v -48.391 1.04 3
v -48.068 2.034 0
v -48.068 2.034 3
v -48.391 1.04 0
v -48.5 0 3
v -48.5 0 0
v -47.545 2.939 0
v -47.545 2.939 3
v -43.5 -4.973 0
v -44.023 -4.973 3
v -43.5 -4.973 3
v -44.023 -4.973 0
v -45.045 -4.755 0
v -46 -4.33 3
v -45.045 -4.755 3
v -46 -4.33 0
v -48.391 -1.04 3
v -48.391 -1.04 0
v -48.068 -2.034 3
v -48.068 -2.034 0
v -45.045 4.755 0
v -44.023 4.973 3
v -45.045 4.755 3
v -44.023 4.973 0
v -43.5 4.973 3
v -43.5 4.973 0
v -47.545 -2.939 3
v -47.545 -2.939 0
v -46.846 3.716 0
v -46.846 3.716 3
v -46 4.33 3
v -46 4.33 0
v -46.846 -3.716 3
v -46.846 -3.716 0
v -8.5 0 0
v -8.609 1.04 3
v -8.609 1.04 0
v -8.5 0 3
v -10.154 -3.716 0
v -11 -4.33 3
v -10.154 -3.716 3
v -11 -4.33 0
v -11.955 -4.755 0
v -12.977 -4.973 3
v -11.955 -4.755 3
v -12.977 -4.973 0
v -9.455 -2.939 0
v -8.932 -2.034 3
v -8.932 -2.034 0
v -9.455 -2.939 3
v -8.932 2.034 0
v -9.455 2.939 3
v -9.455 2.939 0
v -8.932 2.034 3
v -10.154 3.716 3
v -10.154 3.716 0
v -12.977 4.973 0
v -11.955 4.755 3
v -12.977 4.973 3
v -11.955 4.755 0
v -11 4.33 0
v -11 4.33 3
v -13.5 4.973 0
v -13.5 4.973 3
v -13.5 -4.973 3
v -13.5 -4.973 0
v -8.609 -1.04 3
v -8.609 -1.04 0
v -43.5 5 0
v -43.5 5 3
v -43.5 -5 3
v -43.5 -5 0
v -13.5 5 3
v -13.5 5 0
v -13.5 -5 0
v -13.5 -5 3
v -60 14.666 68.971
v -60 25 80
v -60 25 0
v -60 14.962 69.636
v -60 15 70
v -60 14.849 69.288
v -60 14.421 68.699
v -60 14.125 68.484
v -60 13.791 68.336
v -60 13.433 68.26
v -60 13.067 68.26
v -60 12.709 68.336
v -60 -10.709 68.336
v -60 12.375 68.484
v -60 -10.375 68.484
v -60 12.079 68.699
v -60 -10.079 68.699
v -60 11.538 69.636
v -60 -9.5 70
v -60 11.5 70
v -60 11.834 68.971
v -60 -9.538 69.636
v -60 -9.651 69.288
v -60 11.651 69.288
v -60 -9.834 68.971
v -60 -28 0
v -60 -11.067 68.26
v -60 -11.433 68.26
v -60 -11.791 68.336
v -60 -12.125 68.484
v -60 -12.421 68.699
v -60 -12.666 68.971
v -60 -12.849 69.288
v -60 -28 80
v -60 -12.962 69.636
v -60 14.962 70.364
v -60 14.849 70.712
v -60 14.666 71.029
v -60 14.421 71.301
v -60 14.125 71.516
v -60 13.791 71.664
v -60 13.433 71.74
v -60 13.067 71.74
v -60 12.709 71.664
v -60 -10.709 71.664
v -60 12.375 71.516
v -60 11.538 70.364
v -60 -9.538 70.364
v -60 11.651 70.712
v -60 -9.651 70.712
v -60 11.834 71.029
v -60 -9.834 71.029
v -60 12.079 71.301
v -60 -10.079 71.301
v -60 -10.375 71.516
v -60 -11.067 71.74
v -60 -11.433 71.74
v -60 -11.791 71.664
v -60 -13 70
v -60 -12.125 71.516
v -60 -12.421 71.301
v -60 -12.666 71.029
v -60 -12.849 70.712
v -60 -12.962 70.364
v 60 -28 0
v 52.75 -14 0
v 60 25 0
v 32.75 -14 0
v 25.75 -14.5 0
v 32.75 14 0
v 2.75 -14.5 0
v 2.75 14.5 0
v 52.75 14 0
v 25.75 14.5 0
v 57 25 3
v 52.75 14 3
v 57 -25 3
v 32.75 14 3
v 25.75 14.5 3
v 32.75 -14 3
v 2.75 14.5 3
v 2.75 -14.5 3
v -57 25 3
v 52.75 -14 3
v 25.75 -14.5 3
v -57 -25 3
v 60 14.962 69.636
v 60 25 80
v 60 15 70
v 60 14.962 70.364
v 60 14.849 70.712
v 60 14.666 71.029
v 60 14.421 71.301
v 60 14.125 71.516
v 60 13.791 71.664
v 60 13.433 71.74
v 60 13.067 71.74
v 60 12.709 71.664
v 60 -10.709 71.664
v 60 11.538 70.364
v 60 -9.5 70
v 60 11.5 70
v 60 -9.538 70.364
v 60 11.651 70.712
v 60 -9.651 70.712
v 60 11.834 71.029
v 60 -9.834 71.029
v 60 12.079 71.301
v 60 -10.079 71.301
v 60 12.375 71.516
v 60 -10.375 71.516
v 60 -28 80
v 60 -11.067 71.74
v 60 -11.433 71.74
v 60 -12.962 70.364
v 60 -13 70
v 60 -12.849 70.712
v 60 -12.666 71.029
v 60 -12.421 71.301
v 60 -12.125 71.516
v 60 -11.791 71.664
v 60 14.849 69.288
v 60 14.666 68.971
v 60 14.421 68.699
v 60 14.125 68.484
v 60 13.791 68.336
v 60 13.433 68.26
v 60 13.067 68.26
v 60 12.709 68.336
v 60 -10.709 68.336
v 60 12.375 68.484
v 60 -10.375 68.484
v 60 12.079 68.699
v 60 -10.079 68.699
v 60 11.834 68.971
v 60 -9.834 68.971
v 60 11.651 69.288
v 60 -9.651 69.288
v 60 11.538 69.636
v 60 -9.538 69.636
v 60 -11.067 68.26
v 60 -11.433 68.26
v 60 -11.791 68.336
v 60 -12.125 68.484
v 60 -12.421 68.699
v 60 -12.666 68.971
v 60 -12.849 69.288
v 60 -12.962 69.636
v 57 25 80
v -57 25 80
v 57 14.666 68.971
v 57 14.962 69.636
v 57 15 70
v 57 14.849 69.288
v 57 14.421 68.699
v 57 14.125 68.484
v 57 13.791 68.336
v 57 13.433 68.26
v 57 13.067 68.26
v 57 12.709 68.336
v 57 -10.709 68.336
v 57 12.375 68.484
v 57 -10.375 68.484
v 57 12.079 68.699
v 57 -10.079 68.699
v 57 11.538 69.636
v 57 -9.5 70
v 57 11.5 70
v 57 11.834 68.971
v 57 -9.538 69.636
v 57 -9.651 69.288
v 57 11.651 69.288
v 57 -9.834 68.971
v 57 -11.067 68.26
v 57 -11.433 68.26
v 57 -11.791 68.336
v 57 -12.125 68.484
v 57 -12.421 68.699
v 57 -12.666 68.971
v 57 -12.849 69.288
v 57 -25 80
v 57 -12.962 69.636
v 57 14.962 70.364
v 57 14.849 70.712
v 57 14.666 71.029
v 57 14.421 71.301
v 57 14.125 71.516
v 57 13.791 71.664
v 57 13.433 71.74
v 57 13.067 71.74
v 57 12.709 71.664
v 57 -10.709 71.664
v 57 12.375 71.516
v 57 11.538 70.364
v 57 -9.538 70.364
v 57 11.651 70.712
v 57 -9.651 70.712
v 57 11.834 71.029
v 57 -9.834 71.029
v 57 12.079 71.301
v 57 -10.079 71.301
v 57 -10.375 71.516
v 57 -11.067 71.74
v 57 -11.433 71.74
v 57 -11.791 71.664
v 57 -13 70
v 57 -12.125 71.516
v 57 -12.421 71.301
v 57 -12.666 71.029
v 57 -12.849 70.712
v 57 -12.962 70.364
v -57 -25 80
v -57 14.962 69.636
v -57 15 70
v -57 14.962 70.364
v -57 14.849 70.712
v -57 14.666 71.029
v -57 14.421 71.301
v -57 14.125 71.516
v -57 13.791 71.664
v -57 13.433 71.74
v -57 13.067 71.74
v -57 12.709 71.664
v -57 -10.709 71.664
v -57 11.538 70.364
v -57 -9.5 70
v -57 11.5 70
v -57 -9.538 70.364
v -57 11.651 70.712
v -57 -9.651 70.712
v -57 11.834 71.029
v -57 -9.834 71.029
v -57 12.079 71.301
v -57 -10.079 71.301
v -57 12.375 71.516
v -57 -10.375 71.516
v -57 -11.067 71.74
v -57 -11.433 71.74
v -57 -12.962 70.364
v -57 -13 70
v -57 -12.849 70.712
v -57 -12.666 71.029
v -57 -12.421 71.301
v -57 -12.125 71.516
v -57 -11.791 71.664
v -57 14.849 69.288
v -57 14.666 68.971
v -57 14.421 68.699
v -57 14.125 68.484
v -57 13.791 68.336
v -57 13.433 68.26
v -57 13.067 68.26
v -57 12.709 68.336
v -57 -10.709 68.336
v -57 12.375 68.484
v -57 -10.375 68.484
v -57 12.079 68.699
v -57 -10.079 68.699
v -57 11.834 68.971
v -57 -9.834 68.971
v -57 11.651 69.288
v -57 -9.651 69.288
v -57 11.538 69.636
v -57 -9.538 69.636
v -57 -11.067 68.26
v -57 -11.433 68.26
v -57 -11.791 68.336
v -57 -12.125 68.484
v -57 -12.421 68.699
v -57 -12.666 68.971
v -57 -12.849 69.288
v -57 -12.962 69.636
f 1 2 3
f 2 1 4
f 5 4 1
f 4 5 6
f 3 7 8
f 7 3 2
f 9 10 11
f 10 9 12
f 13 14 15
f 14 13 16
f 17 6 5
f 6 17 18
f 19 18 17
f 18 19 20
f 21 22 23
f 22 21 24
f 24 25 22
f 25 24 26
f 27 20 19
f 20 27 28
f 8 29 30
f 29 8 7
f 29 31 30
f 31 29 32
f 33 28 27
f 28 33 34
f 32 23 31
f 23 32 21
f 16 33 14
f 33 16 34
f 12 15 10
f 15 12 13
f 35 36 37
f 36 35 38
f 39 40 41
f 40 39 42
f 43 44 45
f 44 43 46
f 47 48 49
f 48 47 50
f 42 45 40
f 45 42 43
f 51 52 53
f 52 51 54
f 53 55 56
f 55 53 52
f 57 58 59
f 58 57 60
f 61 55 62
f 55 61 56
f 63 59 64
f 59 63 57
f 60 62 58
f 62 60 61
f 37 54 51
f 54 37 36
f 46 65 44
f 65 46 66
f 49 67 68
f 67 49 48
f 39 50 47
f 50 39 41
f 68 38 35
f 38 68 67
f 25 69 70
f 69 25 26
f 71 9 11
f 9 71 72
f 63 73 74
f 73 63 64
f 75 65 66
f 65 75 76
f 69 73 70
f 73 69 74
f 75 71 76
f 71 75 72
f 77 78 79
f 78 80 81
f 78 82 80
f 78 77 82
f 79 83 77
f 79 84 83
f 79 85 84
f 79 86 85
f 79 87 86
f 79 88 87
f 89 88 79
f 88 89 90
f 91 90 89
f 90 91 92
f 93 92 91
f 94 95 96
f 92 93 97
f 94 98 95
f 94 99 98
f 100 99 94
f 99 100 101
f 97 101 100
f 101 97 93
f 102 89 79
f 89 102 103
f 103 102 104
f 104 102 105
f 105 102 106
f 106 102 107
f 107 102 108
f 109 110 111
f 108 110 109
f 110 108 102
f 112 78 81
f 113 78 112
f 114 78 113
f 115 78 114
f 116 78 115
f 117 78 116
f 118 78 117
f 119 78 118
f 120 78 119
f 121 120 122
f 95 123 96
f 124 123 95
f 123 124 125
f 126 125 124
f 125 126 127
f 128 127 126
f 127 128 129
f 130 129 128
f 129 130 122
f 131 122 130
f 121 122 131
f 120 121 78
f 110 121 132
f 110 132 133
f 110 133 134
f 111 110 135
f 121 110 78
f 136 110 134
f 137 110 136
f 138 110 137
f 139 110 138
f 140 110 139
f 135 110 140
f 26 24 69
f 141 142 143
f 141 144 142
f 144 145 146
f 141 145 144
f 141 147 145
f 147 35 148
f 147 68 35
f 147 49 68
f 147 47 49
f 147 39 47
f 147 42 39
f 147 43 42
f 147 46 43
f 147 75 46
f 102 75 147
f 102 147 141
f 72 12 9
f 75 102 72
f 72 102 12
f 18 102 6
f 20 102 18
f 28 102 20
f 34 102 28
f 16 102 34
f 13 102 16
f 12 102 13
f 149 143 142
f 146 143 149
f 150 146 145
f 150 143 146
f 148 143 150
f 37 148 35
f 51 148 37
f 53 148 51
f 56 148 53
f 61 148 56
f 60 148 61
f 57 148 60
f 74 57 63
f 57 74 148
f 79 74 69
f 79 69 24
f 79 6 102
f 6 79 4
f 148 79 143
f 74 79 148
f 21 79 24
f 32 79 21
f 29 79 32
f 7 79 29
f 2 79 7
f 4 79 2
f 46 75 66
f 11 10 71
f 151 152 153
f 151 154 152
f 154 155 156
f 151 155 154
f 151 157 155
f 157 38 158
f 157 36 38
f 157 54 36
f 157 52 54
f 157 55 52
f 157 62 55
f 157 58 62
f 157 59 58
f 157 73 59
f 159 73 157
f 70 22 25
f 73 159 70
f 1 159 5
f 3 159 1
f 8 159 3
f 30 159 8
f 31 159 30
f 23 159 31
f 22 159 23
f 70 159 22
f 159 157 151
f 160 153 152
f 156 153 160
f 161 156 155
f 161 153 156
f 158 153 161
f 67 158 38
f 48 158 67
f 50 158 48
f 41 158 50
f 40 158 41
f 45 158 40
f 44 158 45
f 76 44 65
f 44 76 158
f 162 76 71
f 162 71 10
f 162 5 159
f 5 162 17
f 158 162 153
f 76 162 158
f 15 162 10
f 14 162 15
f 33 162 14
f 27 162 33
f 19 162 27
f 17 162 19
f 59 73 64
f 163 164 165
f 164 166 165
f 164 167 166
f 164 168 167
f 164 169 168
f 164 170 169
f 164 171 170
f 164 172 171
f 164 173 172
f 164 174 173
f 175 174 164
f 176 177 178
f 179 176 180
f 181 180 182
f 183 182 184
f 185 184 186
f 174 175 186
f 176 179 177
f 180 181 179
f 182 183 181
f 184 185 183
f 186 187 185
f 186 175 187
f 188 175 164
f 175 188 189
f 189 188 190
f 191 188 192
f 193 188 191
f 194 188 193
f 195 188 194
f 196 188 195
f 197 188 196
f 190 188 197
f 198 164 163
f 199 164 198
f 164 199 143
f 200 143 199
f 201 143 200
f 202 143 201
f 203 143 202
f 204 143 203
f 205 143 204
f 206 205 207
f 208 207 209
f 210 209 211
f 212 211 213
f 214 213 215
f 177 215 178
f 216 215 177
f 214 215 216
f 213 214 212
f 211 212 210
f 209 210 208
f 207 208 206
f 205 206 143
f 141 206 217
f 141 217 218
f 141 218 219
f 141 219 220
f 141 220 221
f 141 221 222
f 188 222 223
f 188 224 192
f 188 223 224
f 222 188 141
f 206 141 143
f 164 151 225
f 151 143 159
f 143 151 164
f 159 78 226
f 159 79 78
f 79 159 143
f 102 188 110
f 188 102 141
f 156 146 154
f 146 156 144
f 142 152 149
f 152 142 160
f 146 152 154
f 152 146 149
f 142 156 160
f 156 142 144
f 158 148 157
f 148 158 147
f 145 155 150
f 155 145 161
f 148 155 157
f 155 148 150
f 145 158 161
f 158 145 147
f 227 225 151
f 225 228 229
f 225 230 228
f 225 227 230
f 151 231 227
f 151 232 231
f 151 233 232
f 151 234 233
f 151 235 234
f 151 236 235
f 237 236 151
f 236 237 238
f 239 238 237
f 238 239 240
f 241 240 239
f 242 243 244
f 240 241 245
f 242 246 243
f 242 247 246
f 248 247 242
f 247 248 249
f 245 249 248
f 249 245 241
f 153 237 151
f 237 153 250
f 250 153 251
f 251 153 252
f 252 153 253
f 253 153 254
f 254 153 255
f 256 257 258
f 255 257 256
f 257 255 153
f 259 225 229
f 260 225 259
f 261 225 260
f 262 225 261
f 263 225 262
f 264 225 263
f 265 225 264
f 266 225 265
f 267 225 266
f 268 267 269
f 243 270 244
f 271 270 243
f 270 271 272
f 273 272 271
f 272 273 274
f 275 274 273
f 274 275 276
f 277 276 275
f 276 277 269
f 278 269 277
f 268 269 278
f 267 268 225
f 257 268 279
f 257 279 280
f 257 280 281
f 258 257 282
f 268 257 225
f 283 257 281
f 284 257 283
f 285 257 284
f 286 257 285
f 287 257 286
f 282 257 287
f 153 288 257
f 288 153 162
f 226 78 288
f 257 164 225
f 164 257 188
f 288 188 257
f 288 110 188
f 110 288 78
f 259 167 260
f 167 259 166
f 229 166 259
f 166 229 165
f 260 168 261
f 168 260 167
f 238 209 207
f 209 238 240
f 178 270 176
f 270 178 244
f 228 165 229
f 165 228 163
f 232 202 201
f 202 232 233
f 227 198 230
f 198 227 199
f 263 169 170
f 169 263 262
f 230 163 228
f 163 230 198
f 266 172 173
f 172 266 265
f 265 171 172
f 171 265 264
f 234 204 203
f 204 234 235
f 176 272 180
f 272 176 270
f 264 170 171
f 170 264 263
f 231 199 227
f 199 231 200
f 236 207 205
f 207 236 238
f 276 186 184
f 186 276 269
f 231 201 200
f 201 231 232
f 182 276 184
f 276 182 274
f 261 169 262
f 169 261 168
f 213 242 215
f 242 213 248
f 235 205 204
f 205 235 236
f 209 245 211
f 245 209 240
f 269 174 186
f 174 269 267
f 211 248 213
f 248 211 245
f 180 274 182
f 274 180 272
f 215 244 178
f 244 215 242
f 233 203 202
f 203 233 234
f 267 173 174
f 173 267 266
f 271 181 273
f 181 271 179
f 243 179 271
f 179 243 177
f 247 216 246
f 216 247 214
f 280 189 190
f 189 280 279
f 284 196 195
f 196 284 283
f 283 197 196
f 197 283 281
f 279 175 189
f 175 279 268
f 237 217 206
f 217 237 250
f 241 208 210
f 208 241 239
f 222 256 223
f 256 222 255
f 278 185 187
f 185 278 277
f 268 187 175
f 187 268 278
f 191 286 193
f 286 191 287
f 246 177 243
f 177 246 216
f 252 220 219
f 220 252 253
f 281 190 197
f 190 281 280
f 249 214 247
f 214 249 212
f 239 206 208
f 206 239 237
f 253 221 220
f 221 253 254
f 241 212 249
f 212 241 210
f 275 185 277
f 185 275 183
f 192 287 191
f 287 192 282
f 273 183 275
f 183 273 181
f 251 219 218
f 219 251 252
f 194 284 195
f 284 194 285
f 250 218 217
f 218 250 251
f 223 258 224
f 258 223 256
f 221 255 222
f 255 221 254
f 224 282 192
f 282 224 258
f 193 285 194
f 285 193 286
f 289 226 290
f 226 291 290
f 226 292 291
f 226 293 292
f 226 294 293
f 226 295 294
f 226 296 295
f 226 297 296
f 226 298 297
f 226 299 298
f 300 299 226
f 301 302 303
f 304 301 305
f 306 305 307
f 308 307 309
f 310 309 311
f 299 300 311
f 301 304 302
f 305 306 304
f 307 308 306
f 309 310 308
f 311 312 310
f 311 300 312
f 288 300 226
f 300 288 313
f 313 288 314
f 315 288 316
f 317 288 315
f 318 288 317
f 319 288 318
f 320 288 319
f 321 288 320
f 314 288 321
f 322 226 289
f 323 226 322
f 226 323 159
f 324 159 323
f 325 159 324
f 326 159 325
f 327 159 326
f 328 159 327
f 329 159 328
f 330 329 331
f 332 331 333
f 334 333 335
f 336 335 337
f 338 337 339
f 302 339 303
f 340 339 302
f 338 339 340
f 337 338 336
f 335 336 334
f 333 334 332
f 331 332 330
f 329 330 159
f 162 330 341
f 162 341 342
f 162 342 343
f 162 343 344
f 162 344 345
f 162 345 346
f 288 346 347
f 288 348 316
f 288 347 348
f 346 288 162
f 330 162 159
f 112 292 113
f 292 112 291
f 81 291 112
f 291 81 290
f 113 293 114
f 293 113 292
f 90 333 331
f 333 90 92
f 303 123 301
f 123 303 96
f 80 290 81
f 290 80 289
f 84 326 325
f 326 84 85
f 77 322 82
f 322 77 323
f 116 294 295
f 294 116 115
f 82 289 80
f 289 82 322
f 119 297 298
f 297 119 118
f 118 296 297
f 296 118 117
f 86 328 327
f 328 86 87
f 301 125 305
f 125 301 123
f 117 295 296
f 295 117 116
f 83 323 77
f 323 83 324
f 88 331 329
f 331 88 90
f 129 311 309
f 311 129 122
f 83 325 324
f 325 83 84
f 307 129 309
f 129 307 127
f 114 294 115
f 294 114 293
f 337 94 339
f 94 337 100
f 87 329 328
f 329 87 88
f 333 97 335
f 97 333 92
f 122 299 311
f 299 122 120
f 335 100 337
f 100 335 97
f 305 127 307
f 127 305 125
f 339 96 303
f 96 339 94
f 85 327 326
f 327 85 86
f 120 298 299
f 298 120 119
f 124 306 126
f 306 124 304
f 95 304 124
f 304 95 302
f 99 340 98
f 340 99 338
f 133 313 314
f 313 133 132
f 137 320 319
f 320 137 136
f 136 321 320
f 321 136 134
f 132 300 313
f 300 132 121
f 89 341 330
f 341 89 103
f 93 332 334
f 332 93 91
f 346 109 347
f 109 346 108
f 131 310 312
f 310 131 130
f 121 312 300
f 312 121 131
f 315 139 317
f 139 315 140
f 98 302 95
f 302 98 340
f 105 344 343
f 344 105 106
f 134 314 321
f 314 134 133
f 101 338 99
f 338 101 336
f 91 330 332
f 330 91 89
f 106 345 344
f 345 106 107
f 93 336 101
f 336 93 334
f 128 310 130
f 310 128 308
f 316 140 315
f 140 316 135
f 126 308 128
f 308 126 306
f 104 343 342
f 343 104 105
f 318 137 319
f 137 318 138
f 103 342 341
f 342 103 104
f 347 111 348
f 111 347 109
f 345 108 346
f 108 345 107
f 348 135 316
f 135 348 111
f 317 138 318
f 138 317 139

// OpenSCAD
$fn=30;

power_supply_width = 114;
power_supply_height = 50;

bracket_depth = 80;

thickness = 3;

power_connector_w = 20;
power_connector_h = 28;

power_switch_w = 23;
power_switch_h = 29;

power_line_hole_w = 40;
power_line_hole_h = 10;

offset_size = 1.1;
offsetp = ((thickness*offset_size) - thickness) /2;
offsetn = offsetp * -1;

screw_size = 3.5;

part_width = power_supply_width + thickness * 2;
part_height = power_supply_height + thickness;
part_depth = bracket_depth;

module wire_cutout(){
    translate([power_line_hole_w/2 - power_line_hole_h/2,0,0]){
      cylinder(r=power_line_hole_h/2, h=offset_size*thickness, center=true);
    }
    translate([-1 * (power_line_hole_w/2 - power_line_hole_h/2),0,0]){
      cylinder(r=power_line_hole_h/2, h=offset_size*thickness, center=true);
    }
    cube([power_line_hole_w-power_line_hole_h,power_line_hole_h,offset_size*thickness],center=true);
}

module power_connector_cutout(){
  cube([power_connector_w,power_connector_h,thickness*2],center=true);
}

module power_switch_cutout(){
  cube([power_switch_w,power_switch_h,thickness*2], center=true);
}

module faceplate() {
  rotate([0,180,0]){
    difference(){
      translate([0,-1 * thickness/2,0]){
        cube([part_width,part_height,thickness],center=true);
      }
      translate([-1 * (power_supply_width/4 + power_supply_width/8),0,0]){
        power_connector_cutout();
      }
      translate([-1 * power_supply_width/8,0,0]){
        power_switch_cutout();
      }
      translate([power_supply_width/4,0,0]){
        wire_cutout();
      }
    }
  }
}


module topplate(){
  cube([part_width,bracket_depth-thickness,thickness],center=true);
}

module screw_cutout(){
  cylinder(r=screw_size/2,h=offset_size*thickness,center=true);
}
//12 top 10 bottom
top_screw_offset = 12+screw_size/2;
bottom_screw_offset = 10 + screw_size/2;
screw_offset_y = 10;
module sideplate(){
  difference() {
    cube([power_supply_height,bracket_depth-thickness,thickness],center=true);
    translate([power_supply_height/2-bottom_screw_offset,-10 + (bracket_depth-thickness)/2,0]){
      screw_cutout();
    }
    translate([(-1 * power_supply_height/2)+top_screw_offset,-10 + (bracket_depth-thickness)/2,0]){
      screw_cutout();
    }
  }
}

module whole_thing(){
  translate([0,0,thickness/2]){
    faceplate();
    translate([part_width/2 - thickness/2 ,0,part_depth/2]){
      rotate(a=[90,0,90]){
        sideplate();
      }
    }
    translate([-1* (part_width/2 - thickness/2) ,0,part_depth/2]){
      rotate(a=[90,0,90]){
        sideplate();
      }
    }
    translate([0,-1* (part_height/2 ) ,part_depth/2]){
      rotate(a=[90,0,0]){
        topplate();
      }
    }
  }
}

whole_thing();
